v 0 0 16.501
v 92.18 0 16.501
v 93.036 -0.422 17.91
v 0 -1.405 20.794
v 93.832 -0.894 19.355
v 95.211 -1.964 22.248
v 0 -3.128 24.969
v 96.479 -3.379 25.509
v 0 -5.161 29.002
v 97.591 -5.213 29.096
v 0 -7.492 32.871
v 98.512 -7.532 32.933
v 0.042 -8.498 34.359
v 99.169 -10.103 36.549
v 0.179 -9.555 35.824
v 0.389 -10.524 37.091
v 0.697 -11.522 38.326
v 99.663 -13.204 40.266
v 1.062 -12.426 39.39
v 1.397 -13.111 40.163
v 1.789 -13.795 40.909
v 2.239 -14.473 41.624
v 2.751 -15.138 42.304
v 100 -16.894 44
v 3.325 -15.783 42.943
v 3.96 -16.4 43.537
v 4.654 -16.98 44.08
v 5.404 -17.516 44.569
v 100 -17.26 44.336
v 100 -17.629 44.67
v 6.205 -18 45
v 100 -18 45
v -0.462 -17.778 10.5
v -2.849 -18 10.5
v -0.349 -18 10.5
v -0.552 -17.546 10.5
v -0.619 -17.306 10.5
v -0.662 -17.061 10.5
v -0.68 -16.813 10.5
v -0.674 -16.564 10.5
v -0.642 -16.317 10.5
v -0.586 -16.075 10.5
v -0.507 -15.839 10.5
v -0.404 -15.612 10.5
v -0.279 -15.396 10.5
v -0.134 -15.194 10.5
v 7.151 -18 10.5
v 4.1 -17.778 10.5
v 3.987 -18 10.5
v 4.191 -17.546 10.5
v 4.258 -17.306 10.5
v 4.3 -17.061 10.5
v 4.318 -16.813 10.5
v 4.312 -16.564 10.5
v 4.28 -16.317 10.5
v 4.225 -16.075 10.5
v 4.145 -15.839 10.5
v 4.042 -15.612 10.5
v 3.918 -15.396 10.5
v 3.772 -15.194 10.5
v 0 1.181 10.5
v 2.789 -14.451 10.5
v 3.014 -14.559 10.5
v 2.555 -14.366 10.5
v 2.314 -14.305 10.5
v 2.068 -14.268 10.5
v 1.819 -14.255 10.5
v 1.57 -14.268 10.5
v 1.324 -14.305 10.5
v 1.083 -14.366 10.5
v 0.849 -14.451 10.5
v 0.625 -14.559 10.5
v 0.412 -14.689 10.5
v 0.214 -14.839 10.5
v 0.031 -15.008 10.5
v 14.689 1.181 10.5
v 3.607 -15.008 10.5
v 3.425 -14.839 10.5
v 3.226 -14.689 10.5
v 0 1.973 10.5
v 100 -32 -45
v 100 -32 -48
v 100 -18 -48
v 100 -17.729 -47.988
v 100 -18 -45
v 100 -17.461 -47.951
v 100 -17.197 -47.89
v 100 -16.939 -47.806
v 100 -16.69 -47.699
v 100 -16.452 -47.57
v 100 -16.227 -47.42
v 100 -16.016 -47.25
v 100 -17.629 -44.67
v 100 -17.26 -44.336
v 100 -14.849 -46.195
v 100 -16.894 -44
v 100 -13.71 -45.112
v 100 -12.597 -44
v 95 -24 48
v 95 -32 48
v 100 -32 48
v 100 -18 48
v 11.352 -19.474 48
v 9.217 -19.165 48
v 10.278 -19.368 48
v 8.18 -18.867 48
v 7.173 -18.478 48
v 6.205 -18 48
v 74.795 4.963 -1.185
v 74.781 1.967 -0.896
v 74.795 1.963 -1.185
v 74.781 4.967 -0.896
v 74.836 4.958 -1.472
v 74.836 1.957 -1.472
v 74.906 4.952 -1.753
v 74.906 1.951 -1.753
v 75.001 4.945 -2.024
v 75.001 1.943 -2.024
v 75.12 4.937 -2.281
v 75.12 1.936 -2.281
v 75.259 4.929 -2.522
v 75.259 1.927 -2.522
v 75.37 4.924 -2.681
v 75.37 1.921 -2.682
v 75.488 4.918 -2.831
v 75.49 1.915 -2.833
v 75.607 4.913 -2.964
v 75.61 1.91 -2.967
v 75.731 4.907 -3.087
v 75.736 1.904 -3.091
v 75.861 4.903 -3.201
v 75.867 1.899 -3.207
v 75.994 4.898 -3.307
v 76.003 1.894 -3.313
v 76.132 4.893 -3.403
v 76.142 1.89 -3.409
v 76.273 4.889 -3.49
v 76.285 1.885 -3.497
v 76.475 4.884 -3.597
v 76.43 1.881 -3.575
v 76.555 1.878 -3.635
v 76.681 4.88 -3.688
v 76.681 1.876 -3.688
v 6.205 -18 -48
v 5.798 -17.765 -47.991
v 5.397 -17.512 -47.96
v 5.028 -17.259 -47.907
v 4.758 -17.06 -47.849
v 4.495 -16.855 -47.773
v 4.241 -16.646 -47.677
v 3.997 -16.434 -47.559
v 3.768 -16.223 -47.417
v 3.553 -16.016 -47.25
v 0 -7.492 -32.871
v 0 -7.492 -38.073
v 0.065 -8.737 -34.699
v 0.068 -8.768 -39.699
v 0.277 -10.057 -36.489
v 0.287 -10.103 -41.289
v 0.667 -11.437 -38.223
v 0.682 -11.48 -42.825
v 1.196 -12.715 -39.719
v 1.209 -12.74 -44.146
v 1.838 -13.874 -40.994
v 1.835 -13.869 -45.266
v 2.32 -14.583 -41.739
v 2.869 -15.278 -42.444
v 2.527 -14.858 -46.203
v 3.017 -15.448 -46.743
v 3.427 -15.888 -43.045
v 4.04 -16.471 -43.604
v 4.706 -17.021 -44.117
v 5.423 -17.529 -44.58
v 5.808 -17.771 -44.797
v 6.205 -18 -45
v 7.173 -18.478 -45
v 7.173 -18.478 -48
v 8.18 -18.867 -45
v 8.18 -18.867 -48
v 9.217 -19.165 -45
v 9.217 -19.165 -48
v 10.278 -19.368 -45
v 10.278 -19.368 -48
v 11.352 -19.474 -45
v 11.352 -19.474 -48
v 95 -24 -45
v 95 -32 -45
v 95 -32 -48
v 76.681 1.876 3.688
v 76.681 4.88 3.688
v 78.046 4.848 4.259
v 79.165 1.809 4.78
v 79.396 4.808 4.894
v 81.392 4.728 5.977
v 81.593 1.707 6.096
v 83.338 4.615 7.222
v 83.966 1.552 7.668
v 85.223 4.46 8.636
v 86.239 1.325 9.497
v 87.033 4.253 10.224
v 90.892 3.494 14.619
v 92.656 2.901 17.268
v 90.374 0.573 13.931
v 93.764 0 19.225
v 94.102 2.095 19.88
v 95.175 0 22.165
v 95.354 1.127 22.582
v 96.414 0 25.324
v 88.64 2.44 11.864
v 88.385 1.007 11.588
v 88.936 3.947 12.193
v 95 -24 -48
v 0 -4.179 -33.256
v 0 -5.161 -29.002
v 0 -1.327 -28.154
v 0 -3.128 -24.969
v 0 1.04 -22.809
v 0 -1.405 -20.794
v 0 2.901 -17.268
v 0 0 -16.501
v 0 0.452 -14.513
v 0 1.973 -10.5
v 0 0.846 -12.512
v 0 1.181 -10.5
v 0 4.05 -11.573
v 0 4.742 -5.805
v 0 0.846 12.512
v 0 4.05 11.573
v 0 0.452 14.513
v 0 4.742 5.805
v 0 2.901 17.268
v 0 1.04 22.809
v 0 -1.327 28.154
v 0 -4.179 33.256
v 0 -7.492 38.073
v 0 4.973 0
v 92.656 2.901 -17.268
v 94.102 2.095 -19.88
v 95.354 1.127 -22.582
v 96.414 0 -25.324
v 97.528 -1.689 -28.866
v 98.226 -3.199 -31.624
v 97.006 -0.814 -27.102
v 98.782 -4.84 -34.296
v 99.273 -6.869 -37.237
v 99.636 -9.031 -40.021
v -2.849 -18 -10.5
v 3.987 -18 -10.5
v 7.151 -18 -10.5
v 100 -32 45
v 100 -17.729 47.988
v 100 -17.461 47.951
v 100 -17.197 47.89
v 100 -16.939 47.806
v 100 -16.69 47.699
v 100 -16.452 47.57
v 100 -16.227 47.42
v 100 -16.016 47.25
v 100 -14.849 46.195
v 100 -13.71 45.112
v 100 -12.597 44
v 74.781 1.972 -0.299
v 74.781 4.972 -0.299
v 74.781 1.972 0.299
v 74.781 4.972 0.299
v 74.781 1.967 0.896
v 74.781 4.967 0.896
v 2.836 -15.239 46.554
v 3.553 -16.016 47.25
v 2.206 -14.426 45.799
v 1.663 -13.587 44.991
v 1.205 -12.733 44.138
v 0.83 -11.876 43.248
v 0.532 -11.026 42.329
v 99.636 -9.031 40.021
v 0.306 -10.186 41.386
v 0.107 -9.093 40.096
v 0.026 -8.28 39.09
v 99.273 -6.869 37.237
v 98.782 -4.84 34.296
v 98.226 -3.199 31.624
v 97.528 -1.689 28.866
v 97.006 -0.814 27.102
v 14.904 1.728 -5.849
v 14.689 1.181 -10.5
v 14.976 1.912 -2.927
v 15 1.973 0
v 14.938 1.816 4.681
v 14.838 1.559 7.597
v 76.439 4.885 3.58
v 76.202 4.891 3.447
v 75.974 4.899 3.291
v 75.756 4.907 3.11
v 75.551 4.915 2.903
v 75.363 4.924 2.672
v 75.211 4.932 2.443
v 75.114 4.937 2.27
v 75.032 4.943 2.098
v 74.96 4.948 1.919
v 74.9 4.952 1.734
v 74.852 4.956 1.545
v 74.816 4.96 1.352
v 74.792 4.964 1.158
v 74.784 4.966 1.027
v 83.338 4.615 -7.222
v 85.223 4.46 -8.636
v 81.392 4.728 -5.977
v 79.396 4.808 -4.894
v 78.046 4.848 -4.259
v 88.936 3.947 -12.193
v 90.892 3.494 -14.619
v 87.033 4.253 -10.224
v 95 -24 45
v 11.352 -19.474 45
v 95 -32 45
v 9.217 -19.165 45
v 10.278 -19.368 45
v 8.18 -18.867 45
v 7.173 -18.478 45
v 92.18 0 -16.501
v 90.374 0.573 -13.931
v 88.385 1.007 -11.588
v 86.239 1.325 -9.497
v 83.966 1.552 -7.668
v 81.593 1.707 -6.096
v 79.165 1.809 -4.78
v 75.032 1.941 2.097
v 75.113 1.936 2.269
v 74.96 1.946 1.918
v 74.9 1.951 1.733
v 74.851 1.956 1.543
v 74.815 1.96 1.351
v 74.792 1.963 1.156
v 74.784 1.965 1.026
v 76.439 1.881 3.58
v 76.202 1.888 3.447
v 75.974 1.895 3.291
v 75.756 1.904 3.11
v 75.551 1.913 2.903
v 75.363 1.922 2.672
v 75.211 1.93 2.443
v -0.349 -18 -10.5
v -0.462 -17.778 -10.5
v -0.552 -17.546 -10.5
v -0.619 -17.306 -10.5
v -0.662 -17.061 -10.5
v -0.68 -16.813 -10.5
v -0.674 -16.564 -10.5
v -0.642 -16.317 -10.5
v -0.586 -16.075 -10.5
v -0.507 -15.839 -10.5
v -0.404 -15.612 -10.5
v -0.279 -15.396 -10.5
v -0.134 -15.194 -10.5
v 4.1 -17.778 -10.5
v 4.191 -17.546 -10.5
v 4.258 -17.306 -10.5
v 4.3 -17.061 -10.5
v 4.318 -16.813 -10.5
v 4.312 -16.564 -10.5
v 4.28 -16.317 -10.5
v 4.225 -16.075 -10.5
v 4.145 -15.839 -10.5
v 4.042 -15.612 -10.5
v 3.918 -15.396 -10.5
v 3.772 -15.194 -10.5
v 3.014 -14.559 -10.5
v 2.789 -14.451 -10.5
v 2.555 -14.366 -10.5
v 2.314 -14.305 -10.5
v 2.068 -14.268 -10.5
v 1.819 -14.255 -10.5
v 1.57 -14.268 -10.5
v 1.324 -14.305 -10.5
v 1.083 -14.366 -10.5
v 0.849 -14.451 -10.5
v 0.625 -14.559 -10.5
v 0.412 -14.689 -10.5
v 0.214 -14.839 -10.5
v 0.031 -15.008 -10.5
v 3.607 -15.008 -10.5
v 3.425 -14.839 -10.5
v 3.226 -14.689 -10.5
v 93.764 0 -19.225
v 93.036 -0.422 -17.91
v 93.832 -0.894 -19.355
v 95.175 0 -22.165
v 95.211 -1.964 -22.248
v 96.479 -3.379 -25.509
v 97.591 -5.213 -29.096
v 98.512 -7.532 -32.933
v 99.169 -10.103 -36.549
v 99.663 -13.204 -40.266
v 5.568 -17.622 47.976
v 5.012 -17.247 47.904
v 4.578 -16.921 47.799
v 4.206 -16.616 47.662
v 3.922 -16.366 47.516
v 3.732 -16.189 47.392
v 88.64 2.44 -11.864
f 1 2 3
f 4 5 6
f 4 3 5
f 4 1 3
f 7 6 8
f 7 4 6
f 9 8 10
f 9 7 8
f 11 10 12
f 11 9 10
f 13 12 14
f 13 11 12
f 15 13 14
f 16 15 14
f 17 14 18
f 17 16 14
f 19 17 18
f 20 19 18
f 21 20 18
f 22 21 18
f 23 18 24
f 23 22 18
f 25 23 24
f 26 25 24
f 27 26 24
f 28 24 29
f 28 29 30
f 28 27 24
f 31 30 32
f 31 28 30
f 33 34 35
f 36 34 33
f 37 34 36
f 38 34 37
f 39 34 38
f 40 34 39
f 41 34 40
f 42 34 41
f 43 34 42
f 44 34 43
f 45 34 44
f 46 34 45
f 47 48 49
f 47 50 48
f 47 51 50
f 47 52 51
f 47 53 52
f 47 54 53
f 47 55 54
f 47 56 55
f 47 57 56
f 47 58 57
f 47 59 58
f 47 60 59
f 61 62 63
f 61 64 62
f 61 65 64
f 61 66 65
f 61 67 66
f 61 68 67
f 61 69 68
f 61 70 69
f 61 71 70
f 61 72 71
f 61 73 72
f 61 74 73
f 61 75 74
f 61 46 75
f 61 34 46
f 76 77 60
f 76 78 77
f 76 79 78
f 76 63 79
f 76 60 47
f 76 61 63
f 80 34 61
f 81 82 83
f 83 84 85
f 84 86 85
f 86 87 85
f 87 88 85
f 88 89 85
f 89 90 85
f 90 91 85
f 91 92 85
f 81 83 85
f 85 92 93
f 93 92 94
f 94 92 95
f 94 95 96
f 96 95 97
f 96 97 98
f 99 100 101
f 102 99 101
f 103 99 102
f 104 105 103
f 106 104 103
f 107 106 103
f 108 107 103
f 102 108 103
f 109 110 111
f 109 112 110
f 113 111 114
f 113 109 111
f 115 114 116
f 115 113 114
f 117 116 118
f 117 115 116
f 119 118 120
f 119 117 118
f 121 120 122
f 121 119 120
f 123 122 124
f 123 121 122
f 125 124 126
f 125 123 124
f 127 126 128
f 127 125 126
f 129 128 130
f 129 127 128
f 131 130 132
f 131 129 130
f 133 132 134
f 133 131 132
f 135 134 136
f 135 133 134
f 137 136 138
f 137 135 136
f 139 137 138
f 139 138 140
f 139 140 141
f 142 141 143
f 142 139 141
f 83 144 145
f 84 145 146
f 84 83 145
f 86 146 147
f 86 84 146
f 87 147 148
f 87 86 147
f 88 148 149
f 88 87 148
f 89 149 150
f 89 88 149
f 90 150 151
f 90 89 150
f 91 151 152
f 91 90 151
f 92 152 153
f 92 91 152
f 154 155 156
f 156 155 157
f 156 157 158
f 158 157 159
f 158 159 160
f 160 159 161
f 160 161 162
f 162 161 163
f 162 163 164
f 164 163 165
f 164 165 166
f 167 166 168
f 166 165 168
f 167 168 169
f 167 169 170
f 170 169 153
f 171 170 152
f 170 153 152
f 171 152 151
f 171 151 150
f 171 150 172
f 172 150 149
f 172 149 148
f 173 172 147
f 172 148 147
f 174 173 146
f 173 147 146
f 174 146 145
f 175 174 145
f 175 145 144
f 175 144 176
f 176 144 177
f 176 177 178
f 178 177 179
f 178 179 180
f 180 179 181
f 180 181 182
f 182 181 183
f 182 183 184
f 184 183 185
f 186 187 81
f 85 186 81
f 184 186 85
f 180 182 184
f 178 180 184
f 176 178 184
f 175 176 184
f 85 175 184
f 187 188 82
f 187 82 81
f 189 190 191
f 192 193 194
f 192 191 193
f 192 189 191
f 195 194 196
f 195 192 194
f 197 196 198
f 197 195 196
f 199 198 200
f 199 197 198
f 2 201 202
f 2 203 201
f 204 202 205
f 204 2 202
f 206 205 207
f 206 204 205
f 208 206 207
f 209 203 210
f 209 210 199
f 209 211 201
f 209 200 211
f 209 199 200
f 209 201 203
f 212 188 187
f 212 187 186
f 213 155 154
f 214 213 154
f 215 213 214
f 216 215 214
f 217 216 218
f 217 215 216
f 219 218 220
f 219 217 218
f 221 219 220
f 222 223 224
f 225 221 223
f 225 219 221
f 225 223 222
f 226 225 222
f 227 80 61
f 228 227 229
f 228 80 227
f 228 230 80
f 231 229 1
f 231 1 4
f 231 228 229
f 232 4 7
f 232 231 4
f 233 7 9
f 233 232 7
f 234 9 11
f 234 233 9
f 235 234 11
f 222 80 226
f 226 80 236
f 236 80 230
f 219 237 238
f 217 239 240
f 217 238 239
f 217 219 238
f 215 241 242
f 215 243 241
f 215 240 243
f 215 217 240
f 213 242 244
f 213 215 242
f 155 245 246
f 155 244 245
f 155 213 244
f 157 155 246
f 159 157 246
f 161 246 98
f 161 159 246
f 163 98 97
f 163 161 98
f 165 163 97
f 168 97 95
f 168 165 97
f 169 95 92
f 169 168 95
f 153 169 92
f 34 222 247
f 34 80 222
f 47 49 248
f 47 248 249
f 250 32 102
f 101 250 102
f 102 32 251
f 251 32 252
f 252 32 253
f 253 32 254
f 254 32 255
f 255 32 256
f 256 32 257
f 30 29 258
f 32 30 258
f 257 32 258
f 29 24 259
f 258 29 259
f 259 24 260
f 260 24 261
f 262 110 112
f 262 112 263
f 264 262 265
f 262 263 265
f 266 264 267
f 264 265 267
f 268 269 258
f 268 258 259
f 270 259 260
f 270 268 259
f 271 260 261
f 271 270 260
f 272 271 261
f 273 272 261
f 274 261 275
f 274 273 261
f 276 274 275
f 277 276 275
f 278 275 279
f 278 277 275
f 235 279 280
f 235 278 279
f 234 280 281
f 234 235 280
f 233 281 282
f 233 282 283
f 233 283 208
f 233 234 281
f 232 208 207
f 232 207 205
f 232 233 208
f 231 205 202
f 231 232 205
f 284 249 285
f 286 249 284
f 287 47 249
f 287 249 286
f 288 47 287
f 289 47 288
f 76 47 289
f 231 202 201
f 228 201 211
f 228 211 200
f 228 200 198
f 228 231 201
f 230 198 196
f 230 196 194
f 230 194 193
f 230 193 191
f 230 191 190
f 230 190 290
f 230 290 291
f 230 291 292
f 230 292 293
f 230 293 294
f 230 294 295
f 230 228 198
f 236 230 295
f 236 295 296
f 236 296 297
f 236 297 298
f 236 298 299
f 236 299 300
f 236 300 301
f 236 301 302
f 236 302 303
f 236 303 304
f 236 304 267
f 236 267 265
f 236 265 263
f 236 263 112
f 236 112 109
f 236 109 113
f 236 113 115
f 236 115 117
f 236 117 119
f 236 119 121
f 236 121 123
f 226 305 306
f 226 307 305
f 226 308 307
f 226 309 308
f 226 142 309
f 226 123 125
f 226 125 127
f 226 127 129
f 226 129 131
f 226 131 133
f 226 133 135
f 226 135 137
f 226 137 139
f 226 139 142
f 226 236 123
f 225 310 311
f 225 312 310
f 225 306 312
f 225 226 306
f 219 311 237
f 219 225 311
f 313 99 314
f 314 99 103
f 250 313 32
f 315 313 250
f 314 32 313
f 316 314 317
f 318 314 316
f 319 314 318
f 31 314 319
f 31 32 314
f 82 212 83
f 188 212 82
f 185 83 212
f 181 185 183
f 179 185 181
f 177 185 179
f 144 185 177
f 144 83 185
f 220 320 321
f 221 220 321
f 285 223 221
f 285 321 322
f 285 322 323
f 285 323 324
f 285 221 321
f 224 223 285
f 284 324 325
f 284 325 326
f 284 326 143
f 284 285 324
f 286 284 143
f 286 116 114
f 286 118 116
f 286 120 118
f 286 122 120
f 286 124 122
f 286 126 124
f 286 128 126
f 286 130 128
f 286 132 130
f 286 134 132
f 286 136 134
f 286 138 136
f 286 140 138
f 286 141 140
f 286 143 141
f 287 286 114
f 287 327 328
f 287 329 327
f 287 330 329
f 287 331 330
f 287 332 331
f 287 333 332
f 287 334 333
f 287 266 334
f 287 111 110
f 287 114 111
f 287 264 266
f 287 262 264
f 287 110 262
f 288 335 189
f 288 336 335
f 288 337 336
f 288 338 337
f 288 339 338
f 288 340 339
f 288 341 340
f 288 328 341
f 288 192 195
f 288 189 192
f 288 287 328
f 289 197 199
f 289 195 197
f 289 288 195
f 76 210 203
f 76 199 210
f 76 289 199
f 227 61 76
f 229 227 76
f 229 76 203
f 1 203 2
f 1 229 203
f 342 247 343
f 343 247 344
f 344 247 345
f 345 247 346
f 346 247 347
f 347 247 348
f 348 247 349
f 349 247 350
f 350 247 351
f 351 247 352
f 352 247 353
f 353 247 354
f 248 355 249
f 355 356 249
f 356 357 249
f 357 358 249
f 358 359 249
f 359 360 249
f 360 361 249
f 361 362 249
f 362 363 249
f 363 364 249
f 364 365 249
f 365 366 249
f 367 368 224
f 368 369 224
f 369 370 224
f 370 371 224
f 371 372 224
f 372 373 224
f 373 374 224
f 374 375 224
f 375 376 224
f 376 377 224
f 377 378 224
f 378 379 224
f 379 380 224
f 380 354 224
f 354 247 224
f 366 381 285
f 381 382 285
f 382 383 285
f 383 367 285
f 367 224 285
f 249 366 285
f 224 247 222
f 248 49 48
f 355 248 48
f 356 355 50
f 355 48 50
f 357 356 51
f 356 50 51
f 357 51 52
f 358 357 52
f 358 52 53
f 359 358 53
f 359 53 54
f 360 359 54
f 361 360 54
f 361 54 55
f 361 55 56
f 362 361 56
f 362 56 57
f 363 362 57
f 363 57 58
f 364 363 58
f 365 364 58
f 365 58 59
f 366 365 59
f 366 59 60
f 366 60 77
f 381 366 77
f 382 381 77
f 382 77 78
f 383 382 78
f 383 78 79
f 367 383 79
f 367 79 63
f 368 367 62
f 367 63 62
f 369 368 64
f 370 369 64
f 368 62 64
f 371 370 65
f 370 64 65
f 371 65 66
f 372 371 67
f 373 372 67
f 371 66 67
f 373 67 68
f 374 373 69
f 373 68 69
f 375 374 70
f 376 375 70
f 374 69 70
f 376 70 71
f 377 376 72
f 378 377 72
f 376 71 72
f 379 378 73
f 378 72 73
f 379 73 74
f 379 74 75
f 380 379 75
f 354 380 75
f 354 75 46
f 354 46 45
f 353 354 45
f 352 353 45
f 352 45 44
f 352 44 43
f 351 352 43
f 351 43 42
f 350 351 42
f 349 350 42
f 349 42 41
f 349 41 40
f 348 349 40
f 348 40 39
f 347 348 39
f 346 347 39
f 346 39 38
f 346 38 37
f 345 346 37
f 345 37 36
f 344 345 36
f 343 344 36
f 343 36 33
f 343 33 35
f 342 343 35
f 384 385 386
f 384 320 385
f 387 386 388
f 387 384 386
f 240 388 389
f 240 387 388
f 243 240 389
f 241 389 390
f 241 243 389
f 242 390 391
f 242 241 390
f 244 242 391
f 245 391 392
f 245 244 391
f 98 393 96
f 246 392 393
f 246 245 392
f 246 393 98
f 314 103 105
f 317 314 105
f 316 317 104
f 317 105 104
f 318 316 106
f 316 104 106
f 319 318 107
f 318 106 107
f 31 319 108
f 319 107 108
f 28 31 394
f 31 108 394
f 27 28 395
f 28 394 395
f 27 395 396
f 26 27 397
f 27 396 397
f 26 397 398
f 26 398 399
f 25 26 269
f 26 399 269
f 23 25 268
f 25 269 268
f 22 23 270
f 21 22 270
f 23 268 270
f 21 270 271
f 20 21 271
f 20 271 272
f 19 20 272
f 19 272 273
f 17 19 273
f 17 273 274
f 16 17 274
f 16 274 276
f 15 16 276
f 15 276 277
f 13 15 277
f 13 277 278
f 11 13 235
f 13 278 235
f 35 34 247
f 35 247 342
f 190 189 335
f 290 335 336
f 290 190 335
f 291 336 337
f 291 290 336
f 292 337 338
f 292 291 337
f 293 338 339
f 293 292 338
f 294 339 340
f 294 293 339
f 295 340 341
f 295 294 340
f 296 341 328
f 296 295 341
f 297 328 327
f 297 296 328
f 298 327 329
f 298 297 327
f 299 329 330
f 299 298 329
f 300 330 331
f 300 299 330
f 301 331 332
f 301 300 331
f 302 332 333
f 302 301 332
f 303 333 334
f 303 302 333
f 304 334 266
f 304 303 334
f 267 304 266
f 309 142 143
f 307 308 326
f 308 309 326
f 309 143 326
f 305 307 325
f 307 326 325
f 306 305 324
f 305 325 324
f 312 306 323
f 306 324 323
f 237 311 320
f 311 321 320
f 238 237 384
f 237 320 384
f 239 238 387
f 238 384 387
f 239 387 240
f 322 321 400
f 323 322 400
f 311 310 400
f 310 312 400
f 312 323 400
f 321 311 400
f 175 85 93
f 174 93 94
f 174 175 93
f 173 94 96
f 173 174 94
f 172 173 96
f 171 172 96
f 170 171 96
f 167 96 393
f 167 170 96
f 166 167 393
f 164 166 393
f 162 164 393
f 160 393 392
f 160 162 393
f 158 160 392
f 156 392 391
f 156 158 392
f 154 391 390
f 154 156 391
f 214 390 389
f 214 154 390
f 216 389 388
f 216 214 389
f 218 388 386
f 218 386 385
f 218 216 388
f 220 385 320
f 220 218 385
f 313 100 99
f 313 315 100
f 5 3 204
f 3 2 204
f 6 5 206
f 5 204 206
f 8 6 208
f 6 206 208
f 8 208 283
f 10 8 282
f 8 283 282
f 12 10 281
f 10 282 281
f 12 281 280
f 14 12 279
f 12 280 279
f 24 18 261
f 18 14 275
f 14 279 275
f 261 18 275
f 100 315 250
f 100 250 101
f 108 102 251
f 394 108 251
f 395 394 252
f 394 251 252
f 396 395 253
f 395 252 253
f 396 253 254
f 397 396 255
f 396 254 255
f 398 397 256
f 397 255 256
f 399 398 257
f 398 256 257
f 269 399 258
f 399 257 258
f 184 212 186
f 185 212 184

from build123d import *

# Parameters (mm, degrees)
EXTRUDE_THIN1_DEPTH = 100
CUT_EXTRUDE2_DEPTH  = 33.5
FILLET1_R           = 3
SKETCH6_W           = 108.670856817
SKETCH6_H           = 17.879774232
CUT_EXTRUDE3_DEPTH  = 166
BOSS_EXTRUDE1_DEPTH = 10.5
CUT_EXTRUDE4_DEPTH  = 27
CUT_EXTRUDE7_DEPTH  = 5
FILLET5_R           = 12


with BuildPart() as part:
    # Sketch1 → Extrude-Thin1 (new body)
    with BuildSketch(Plane(origin=(0, 0, 0), x_dir=(0, 0, -1), z_dir=(1, 0, 0))):
        with BuildLine():
            Line((45, -32), (45, -18))
            ThreePointArc((45, -18), (32.040658091, -6.957616726), (16.501342128, 0))
            ThreePointArc((16.501342128, 0), (0, 1.972757604), (-16.501342128, 0))
            ThreePointArc((-16.501342128, 0), (-32.040658091, -6.957616726), (-45, -18))
            Line((-45, -18), (-45, -32))
            Line((-45, -32), (-48, -32))
            Line((-48, -32), (-48, -16.88185814))
            ThreePointArc((-48, -16.88185814), (-34.099982932, -4.712774746), (-17.26768466, 2.901081048))
            ThreePointArc((-17.26768466, 2.901081048), (0, 4.972757604), (17.26768466, 2.901081048))
            ThreePointArc((17.26768466, 2.901081048), (34.099982932, -4.712774746), (48, -16.88185814))
            Line((48, -16.88185814), (48, -32))
            Line((48, -32), (45, -32))
        make_face()
    extrude(amount=EXTRUDE_THIN1_DEPTH)

    # Sketch5 → Cut-Extrude2 (cut, symmetric)
    with BuildSketch(Plane(origin=(0, 0, 0), x_dir=(1, 0, 0), z_dir=(0, 1, 0))):
        with BuildLine():
            Line((74.78082212, 3), (74.78082212, -3))
            add(Edge.make_bspline(
                [(74.78082212, -3), (97.634090292, -10.562952057), (100, -44)],
                knots=[0, 0, 0, 1, 1, 1], degree=2))
            Line((100, -44), (100, 44))
            add(Edge.make_bspline(
                [(74.78082212, 3), (97.634090292, 10.562952057), (100, 44)],
                knots=[0, 0, 0, 1, 1, 1], degree=2))
        make_face()
    extrude(amount=CUT_EXTRUDE2_DEPTH, both=True, mode=Mode.SUBTRACT)

    # Fillet1
    fillet1_edges = [part.edges().sort_by_distance(p)[0] for p in [
        (50, -16.88185814, -48),
        (50, -16.88185814, 48),
        (74.78082212, 3.409765032, 3),
        (74.78082212, 3.409765032, -3),
        (46.328171757, 2.901081048, -17.26768466),
        (46.328171757, 2.901081048, 17.26768466),
    ]]
    fillet(fillet1_edges, radius=FILLET1_R)

    # Sketch6 → Cut-Extrude3 (cut)
    with BuildSketch(Plane(origin=(0, 0, -48), x_dir=(-1, 0, 0), z_dir=(0, 0, -1))):
        with Locations((-40.664571591, -32.939887116)):
            Rectangle(SKETCH6_W, SKETCH6_H)
    extrude(amount=-CUT_EXTRUDE3_DEPTH, mode=Mode.SUBTRACT)

    # Sketch8 → Boss-Extrude1 (add, symmetric)
    with BuildSketch(Plane.XY):
        Polygon((0, 1.972757604), (-2.848910504, -18), (7.151089496, -18), (15, 1.972757604), align=None)
    extrude(amount=BOSS_EXTRUDE1_DEPTH, both=True)

    # Sketch10 → Cut-Extrude4 (cut)
    with BuildSketch(Plane.XY.offset(10.5)):
        with BuildLine():
            Line((-0.348910504, -18), (3.987157996, -18))
            ThreePointArc((3.987157996, -18), (1.819123746, -14.255159652), (-0.348910504, -18))
        make_face()
    extrude(amount=-CUT_EXTRUDE4_DEPTH, mode=Mode.SUBTRACT)

    # Sketch15 → Cut-Extrude7 (cut)
    with BuildSketch(Plane(origin=(0, 0, -48), x_dir=(-1, 0, 0), z_dir=(0, 0, -1))):
        Polygon((-95, -24), (0, -18.860125055), (0, -26.57204687), align=None)
    cut_extrude7 = extrude(amount=-CUT_EXTRUDE7_DEPTH, mode=Mode.SUBTRACT)

    # Mirror2: Cut-Extrude7 across plane
    add(cut_extrude7.mirror(Plane.XY), mode=Mode.SUBTRACT)

    # Fillet5
    # the kernel refuses this fillet: 12 mm, written as the material it takes off along each edge
    with BuildSketch(Plane(origin=(0, -18.860125055, 76.420758066), x_dir=(0, 1, 0), z_dir=(0, 0, -1))) as fillet5_piece_1:
        with BuildLine():
            CenterArc((FILLET5_R * 0.947358602211, FILLET5_R), FILLET5_R, 183.096908366, 86.903091634)
            Line((-FILLET5_R * 0.0511809847104, FILLET5_R * 0.945975067318), (0, 0))
            Line((0, 0), (FILLET5_R * 0.947358602211, 0))
        make_face()
    extrude(amount=59.841516133, mode=Mode.SUBTRACT)
    with BuildSketch(Plane(origin=(0, -18.860125055, -76.420758066), x_dir=(0, 1, 0), z_dir=(0, 0, 1))) as fillet5_piece_2:
        with BuildLine():
            CenterArc((FILLET5_R * 0.947358602211, -FILLET5_R), FILLET5_R, 90, 86.903091634)
            Line((-FILLET5_R * 0.0511809847104, -FILLET5_R * 0.945975067318), (0, 0))
            Line((0, 0), (FILLET5_R * 0.947358602211, 0))
        make_face()
    extrude(amount=59.841516133, mode=Mode.SUBTRACT)


solid = part.part
